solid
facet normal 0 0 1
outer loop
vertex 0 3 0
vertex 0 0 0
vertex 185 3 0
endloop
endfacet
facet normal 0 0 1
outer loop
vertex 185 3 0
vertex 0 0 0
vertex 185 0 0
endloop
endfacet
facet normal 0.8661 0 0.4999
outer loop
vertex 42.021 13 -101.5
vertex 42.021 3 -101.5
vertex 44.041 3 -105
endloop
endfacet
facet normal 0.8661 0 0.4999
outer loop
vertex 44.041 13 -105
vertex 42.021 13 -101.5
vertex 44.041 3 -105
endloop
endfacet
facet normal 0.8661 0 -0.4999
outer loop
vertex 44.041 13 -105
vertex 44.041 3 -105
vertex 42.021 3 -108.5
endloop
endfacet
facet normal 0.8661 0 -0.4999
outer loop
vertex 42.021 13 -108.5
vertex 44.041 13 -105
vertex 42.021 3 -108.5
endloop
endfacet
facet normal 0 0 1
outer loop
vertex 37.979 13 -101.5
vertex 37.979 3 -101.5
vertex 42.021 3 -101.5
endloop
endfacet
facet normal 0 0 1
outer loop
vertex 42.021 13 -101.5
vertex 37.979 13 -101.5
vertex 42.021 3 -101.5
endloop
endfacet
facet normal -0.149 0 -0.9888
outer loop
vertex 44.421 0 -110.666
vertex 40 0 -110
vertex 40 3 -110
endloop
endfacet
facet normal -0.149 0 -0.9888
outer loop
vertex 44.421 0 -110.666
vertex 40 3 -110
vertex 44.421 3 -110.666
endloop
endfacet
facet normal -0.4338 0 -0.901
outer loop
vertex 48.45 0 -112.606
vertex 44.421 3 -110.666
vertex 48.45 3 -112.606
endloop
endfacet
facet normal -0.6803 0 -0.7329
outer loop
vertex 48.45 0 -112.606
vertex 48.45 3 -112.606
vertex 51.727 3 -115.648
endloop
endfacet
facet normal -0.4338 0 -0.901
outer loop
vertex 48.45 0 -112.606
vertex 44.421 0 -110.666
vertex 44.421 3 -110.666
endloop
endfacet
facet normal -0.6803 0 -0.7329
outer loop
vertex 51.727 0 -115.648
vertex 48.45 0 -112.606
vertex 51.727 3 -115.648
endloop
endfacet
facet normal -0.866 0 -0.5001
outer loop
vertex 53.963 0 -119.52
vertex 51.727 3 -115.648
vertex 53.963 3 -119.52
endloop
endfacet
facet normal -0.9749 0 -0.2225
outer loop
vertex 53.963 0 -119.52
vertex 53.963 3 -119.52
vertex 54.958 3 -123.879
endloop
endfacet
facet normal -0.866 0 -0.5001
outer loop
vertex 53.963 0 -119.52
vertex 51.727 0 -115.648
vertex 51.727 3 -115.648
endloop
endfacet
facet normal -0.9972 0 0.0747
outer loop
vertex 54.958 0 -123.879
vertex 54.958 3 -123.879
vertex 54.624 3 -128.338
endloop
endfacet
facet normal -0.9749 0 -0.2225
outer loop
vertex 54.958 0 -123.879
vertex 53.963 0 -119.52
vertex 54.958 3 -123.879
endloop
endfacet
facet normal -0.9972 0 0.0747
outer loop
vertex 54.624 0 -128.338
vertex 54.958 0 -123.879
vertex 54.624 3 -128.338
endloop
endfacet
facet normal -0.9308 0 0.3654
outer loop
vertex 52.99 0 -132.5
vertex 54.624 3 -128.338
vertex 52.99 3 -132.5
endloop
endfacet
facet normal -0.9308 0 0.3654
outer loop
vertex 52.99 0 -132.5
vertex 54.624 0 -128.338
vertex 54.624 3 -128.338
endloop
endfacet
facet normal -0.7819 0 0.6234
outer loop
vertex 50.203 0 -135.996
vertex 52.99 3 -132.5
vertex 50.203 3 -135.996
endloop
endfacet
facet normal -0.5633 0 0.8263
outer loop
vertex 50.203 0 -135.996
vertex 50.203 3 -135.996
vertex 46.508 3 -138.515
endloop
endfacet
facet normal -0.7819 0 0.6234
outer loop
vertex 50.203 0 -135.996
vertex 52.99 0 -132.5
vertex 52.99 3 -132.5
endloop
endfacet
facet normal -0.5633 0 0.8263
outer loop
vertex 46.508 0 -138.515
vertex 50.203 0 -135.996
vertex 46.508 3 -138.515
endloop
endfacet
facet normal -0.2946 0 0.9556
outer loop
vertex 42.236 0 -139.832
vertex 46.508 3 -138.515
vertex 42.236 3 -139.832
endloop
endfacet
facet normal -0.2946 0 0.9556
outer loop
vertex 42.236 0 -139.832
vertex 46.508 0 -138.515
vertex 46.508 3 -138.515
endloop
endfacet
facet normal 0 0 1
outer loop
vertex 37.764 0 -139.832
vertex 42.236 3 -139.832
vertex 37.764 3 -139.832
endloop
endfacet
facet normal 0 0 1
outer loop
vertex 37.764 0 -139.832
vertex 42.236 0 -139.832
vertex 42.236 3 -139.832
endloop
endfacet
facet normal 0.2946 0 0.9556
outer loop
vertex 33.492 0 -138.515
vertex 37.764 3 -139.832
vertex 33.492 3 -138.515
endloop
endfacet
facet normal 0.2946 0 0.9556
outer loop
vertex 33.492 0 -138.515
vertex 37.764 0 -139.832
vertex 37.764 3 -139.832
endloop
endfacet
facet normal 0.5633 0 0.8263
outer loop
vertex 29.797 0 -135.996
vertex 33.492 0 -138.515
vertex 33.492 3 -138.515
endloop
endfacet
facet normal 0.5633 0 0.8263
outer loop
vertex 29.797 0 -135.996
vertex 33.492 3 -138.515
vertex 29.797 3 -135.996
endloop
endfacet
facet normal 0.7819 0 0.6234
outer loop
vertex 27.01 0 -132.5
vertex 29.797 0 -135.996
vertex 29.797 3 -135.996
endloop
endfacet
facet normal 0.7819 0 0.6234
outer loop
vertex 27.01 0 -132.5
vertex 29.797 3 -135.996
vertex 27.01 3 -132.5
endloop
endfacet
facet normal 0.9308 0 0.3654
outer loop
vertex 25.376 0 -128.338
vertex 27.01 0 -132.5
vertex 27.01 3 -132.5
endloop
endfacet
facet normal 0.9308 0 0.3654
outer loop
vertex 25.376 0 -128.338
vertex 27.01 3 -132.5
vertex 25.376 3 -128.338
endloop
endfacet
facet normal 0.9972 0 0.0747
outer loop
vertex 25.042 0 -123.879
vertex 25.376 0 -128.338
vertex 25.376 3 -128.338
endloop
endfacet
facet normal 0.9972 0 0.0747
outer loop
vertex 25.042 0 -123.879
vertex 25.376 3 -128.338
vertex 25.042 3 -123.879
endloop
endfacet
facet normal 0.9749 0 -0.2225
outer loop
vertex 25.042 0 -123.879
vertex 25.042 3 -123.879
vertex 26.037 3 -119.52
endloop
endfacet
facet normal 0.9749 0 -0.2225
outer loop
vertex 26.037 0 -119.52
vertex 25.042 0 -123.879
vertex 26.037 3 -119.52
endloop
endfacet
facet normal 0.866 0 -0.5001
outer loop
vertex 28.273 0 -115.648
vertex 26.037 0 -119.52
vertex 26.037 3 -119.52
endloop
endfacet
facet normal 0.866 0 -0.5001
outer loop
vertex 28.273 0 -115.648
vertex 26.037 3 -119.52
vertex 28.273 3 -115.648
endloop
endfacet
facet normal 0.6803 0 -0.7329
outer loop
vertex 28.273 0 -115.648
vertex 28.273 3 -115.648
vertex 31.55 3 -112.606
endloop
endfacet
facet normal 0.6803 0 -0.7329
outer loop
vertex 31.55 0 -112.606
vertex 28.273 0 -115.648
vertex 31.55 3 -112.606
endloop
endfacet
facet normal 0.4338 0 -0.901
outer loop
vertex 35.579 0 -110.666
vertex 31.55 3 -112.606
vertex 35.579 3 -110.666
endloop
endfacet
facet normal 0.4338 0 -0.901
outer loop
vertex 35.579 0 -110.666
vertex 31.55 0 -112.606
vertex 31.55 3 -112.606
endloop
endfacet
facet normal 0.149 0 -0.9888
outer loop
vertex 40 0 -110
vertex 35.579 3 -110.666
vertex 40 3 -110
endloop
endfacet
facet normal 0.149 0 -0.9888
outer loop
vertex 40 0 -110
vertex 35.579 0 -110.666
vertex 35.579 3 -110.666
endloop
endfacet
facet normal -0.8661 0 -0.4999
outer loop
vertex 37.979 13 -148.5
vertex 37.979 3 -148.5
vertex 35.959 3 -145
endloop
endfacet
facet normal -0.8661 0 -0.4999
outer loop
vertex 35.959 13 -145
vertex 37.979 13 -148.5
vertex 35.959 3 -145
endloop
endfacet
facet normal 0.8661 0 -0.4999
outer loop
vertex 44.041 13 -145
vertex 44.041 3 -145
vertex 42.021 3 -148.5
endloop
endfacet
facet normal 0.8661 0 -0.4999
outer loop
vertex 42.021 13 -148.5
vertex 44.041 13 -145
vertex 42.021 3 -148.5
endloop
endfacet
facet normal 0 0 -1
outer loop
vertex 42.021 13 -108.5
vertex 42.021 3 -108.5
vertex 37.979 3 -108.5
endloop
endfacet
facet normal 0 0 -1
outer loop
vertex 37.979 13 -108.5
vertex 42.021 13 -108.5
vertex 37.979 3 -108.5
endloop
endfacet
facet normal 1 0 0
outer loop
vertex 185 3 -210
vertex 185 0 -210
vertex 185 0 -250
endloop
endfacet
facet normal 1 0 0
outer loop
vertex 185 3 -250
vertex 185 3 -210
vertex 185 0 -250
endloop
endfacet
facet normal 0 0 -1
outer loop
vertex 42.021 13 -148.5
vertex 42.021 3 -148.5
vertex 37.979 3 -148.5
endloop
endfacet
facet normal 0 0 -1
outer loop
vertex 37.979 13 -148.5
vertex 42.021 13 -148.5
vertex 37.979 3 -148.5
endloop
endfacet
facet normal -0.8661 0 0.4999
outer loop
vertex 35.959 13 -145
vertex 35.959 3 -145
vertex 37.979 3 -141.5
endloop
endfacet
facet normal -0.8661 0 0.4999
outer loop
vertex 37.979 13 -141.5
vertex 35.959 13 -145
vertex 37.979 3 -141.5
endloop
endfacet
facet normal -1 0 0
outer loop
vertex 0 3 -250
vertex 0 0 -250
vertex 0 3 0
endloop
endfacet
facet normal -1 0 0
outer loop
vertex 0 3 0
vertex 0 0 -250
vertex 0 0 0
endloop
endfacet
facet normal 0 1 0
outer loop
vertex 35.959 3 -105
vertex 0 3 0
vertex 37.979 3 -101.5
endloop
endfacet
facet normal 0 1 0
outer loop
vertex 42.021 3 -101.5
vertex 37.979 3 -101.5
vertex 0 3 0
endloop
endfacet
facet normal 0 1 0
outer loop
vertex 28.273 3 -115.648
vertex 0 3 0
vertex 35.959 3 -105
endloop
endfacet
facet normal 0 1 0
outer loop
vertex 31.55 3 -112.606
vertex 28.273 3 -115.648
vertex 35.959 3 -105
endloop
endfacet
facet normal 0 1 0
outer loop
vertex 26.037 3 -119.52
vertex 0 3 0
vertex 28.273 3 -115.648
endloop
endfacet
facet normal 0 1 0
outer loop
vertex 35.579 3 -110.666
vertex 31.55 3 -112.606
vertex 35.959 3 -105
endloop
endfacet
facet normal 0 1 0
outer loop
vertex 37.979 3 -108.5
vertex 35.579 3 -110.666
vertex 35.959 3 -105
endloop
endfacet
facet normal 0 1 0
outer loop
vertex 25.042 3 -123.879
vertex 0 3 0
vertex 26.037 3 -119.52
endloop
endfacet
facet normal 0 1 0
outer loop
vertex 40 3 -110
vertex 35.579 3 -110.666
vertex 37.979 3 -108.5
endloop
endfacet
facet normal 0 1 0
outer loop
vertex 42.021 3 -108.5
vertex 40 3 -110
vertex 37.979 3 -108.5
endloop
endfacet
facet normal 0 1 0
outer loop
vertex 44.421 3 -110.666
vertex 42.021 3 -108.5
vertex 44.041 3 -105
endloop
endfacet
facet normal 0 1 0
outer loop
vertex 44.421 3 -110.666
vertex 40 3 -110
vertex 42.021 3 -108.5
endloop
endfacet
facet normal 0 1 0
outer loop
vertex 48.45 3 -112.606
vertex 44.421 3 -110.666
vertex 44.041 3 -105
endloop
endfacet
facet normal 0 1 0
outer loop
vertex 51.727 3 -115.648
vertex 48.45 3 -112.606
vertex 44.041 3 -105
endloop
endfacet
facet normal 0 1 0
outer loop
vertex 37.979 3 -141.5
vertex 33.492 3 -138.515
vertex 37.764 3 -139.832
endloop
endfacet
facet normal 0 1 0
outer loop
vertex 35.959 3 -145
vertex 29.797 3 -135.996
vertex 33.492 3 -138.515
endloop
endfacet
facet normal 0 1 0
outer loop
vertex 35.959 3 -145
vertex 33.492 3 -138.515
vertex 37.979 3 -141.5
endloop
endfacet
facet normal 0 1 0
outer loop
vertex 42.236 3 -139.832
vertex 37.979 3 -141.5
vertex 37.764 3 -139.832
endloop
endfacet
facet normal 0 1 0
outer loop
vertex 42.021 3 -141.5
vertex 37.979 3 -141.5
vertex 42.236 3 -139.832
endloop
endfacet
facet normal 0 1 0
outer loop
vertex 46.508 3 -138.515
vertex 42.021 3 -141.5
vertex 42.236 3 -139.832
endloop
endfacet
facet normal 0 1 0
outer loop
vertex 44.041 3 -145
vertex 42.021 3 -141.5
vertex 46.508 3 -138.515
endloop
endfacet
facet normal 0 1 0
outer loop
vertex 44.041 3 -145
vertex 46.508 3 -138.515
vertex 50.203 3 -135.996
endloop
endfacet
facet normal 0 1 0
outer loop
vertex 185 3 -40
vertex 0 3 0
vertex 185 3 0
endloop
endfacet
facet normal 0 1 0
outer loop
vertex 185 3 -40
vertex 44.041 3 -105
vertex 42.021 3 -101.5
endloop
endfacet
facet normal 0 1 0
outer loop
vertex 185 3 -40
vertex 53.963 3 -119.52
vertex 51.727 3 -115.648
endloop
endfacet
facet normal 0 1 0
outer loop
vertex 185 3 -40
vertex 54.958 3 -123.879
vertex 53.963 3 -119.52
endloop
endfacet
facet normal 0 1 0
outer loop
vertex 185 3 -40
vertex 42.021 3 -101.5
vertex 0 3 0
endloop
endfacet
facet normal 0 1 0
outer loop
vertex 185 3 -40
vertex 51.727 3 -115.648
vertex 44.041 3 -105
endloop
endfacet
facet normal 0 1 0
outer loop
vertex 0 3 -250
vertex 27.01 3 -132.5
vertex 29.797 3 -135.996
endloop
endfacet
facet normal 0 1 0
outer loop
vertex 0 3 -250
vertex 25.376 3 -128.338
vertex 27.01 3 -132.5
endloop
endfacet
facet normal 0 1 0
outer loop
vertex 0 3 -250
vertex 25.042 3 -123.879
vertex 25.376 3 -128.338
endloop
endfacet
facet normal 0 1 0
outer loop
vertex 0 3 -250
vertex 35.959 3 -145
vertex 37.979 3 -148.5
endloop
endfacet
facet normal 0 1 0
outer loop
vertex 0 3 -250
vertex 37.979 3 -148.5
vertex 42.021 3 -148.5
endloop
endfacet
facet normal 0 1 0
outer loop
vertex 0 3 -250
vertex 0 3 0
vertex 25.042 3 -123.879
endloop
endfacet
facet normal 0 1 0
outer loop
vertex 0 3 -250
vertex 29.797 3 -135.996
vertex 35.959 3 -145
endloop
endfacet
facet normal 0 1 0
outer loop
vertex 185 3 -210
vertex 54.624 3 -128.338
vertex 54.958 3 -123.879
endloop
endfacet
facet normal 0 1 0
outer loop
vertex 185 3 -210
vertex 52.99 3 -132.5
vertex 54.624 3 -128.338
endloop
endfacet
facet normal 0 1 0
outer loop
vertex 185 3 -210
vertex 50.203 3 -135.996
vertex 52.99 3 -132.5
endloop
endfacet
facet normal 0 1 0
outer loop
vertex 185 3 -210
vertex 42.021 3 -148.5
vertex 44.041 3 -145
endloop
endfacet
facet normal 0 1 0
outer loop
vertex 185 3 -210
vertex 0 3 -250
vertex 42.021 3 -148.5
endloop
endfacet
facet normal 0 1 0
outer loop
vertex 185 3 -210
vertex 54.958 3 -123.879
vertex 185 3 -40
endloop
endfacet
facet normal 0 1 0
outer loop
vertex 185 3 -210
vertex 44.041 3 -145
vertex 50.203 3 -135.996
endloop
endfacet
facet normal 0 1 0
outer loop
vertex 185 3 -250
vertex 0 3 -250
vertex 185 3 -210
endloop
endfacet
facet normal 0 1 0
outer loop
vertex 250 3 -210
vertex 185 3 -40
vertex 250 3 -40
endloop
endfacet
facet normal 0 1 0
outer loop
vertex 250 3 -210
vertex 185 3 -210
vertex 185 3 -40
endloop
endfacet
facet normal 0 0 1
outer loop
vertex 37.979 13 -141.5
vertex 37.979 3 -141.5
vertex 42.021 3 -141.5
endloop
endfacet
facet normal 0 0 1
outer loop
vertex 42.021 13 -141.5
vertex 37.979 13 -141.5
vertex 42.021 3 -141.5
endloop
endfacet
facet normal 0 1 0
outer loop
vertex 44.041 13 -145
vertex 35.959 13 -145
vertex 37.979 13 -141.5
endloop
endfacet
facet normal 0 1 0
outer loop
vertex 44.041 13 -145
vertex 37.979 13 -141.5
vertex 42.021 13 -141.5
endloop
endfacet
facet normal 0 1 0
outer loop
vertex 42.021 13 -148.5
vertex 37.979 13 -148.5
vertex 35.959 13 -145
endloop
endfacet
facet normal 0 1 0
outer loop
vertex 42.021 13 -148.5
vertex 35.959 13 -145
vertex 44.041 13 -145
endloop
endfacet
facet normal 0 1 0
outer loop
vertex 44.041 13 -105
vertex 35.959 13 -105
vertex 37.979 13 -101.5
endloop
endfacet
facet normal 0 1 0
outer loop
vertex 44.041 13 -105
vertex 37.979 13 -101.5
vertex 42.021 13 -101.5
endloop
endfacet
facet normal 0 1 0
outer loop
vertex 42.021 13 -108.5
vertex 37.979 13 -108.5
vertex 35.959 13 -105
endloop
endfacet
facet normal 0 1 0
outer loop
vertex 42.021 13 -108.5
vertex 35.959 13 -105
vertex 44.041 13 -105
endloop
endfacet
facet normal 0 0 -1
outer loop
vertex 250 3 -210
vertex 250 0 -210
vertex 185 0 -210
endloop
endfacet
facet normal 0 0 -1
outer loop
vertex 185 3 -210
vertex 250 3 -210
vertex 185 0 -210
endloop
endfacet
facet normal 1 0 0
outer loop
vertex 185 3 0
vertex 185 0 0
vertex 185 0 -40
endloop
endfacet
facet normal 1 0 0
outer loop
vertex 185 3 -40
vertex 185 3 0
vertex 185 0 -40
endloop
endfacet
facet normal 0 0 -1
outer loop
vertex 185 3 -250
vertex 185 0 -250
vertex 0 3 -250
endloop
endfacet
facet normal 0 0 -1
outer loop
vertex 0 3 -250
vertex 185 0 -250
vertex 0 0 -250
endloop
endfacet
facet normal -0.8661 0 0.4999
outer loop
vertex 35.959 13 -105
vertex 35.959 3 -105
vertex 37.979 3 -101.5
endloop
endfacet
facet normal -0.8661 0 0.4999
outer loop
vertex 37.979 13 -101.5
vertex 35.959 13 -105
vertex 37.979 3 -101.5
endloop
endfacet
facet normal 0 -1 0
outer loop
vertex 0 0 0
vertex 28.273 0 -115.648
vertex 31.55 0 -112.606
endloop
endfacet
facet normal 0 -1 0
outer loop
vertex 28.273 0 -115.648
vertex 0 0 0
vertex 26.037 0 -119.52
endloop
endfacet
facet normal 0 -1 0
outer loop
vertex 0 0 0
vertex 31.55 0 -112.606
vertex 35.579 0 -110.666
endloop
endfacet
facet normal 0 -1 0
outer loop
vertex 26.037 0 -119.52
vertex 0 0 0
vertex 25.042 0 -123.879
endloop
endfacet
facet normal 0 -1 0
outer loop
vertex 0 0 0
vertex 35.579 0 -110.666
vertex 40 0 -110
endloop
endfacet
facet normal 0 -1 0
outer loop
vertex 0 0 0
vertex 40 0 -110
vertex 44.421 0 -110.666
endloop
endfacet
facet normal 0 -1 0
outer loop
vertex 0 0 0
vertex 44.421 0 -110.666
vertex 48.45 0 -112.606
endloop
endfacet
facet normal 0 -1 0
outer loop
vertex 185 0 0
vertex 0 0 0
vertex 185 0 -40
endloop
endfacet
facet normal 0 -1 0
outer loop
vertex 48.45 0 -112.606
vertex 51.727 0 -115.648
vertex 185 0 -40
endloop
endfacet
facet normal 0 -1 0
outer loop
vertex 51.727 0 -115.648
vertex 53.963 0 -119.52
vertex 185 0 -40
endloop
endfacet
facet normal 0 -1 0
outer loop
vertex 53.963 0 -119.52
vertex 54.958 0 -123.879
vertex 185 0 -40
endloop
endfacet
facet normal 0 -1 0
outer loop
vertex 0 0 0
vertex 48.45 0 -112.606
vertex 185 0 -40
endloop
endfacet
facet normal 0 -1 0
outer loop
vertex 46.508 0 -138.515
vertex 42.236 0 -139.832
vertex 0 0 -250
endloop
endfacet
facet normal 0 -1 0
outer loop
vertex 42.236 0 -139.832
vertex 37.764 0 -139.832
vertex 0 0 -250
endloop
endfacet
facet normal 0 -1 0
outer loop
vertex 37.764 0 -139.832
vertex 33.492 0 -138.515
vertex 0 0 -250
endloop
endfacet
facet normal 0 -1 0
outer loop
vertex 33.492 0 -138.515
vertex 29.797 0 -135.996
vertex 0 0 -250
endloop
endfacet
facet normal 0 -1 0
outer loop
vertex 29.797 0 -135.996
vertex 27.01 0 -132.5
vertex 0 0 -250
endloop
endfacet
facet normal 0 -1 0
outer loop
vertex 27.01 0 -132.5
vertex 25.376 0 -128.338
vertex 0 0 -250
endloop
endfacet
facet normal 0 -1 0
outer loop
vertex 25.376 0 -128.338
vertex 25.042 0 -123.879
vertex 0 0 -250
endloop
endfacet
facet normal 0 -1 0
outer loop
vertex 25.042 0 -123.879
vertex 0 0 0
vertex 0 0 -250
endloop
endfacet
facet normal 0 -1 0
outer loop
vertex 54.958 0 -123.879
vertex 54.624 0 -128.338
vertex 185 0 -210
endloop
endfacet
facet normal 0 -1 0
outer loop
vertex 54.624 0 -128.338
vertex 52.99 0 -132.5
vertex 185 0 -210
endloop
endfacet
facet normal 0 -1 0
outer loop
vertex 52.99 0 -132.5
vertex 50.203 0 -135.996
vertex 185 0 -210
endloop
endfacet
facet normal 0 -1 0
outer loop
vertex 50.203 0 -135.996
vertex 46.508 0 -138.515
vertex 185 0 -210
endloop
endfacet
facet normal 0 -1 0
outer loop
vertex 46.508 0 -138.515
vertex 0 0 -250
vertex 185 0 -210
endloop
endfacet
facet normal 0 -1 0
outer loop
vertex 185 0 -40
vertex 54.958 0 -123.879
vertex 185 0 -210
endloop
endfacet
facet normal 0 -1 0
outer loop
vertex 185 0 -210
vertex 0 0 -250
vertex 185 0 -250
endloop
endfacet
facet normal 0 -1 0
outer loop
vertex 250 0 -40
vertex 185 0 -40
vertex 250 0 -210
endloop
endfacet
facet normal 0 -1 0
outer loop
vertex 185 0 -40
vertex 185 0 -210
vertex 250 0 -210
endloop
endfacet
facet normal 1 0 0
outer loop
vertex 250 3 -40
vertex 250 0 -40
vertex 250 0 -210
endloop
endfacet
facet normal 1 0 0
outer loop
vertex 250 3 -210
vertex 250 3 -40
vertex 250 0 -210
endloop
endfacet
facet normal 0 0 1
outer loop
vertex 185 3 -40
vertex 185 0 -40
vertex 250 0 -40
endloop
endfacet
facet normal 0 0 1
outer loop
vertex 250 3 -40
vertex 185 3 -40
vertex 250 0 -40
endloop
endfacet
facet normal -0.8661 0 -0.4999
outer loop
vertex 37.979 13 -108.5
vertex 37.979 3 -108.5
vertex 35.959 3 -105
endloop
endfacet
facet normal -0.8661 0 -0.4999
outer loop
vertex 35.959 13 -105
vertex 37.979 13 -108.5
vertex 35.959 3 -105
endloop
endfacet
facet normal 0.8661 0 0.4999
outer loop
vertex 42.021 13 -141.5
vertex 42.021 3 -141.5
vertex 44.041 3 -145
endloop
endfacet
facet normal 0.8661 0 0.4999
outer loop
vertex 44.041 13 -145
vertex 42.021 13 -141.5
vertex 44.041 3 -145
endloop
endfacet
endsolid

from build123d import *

# Parameters (mm, degrees)
SKETCH1_R           = 15
BOSS_EXTRUDE2_DEPTH = 3
BOSS_EXTRUDE3_DEPTH = 10


with BuildPart() as part:
    # Sketch1 → Boss-Extrude2 (new body)
    with BuildSketch(Plane(origin=(0, 0, 0), x_dir=(1, 0, 0), z_dir=(0, 1, 0))):
        Polygon((0, 0), (185, 0), (185, 40), (250, 40), (250, 210), (185, 210), (185, 250), (0, 250), align=None)
        with Locations(Location((40, 125, 0), (0, 0, 270))):
            Circle(SKETCH1_R, mode=Mode.SUBTRACT)
    extrude(amount=BOSS_EXTRUDE2_DEPTH)

    # Sketch2 → Boss-Extrude3 (add)
    with BuildSketch(Plane(origin=(0, 3, 0), x_dir=(1, 0, 0), z_dir=(0, 1, 0))):
        Polygon((44.041451884, 145), (42.020725942, 148.5), (37.979274058, 148.5), (35.958548116, 145), (37.979274058, 141.5), (42.020725942, 141.5), align=None)
        Polygon((44.041451884, 105), (42.020725942, 108.5), (37.979274058, 108.5), (35.958548116, 105), (37.979274058, 101.5), (42.020725942, 101.5), align=None)
    extrude(amount=BOSS_EXTRUDE3_DEPTH)


solid = part.part
